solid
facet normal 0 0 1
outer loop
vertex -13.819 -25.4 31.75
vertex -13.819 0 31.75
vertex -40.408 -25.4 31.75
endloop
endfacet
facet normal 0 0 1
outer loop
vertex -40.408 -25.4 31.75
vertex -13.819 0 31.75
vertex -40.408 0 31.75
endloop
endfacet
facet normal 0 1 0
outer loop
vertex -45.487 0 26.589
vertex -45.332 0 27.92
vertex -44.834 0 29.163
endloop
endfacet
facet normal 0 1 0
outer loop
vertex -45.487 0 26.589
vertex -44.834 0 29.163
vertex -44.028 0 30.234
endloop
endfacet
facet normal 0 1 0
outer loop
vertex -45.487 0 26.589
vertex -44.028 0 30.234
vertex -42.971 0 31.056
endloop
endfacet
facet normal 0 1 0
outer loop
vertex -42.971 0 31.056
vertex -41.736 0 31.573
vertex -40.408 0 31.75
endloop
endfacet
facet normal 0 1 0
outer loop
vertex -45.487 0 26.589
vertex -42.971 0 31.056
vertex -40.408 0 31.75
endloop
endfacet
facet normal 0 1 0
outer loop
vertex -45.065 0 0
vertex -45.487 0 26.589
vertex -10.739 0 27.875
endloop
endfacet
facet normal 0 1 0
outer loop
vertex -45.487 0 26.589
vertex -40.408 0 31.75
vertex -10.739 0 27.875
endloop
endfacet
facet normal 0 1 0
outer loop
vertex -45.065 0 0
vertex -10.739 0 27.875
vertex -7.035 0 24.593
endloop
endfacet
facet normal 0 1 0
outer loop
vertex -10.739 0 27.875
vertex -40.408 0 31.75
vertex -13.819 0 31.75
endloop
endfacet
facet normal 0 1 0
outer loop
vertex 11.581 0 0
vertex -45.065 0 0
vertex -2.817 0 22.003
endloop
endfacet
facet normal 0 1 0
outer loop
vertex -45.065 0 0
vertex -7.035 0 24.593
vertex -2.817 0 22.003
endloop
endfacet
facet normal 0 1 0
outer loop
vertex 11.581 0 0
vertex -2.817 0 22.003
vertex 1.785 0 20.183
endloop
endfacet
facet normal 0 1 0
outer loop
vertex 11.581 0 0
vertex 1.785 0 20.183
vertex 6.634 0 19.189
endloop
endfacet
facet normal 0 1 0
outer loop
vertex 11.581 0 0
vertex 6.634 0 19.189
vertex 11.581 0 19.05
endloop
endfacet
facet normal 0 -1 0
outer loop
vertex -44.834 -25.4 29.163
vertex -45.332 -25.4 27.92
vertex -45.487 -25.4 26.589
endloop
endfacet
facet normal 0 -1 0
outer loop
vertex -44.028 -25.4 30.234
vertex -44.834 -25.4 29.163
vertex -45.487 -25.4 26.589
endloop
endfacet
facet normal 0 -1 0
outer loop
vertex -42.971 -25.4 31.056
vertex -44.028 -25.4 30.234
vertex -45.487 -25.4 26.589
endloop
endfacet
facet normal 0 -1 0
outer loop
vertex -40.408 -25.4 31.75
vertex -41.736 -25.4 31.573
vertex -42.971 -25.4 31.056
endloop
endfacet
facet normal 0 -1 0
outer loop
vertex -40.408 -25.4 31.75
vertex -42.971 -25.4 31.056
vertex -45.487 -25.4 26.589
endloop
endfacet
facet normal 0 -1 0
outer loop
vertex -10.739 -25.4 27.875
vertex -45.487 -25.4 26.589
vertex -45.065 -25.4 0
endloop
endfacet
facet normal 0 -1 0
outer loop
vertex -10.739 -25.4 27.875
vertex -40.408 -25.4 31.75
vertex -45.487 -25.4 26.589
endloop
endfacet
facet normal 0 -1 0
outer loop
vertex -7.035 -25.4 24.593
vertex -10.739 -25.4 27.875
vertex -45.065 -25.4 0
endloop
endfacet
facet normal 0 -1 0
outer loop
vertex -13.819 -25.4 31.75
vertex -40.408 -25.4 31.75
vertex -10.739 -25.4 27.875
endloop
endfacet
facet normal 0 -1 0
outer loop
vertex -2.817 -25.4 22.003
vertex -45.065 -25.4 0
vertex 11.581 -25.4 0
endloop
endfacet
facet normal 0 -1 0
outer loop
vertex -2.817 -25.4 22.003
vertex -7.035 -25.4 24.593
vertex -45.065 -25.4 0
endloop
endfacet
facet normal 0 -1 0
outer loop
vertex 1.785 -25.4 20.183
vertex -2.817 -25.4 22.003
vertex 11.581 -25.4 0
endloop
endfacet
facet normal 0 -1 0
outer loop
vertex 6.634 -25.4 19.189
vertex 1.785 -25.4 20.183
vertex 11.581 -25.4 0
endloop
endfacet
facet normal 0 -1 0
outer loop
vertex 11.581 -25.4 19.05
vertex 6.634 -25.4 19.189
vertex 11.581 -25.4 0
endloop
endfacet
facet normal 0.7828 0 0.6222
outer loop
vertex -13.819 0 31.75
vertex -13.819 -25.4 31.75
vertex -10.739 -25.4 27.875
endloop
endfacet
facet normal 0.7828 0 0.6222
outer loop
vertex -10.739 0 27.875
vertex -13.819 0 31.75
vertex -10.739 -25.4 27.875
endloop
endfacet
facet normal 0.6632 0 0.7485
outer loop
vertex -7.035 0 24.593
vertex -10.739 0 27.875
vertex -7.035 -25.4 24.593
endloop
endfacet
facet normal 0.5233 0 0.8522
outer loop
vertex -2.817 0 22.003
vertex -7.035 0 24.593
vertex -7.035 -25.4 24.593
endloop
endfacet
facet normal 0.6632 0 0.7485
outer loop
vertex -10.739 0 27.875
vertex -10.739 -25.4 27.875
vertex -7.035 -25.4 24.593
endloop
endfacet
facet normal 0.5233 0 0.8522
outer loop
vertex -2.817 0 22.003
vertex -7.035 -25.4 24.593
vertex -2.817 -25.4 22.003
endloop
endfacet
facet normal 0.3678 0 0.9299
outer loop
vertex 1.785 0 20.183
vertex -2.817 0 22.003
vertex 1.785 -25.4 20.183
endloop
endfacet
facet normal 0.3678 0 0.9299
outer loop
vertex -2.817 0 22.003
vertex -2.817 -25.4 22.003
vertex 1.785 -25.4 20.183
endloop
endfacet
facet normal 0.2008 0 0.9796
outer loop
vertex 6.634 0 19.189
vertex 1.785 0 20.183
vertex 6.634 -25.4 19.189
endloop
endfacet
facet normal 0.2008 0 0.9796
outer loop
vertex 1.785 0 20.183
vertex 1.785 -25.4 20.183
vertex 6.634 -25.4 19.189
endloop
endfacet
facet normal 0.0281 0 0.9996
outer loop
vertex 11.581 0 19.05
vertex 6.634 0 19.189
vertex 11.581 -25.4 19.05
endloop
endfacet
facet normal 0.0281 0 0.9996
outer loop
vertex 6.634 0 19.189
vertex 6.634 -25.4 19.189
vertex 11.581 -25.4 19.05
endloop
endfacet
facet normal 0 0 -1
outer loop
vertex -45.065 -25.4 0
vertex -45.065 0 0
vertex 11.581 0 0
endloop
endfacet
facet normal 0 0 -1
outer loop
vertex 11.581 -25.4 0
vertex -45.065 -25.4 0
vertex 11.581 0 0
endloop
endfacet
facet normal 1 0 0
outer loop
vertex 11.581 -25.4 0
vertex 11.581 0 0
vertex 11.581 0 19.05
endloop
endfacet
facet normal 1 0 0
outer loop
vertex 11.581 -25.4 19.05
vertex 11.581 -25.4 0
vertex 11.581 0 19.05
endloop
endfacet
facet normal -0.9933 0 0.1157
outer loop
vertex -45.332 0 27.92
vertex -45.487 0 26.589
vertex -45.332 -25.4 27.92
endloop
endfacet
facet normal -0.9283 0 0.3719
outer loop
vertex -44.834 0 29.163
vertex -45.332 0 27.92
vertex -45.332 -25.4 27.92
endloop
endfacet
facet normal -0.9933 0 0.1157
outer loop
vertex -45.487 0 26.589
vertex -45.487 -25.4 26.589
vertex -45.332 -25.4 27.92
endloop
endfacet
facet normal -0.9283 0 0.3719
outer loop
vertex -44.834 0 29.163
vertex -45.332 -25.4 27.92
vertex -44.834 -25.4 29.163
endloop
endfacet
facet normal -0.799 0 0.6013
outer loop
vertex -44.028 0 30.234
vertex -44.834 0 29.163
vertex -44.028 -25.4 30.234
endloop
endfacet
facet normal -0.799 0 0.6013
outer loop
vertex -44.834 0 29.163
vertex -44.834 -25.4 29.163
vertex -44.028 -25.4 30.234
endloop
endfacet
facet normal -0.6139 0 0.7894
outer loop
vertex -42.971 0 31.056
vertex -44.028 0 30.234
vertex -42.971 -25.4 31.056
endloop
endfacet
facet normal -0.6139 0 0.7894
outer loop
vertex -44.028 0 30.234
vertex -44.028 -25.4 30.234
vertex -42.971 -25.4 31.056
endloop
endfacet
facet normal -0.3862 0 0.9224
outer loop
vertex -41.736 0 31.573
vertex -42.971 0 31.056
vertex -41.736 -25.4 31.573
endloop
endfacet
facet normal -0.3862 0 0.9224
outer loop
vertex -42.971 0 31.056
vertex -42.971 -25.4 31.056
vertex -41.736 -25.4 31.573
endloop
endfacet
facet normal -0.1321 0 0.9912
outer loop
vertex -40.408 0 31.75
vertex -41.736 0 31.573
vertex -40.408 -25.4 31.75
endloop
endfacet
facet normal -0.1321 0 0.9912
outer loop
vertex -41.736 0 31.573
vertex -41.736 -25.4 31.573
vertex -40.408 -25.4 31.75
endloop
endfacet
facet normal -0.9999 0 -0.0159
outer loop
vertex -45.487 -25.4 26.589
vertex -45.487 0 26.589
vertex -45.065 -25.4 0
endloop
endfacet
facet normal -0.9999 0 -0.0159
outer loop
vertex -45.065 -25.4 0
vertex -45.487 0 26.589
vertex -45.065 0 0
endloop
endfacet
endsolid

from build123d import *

# Parameters (mm, degrees)
F1_DEPTH = 25.4
F3_DEPTH = 25.4
F4_R     = 5.08


with BuildPart() as f1:
    # F0 (on Front) → F1 (new body)
    with BuildSketch(Plane.XZ):
        Polygon((-45.568943, 31.75), (-45.065421, 0), (11.581057, 0), (11.581057, 31.75), align=None)
    extrude(amount=F1_DEPTH)

    # F2 (on face) → F3 (cut)
    with BuildSketch(Plane.XZ.offset(25.4)):
        with BuildLine():
            Line((11.581057, 31.75), (-13.818943, 31.75))
            ThreePointArc((-13.818943, 31.75), (-2.817404, 22.003079), (11.581057, 19.05))
            Line((11.581057, 19.05), (11.581057, 31.75))
        make_face()
    extrude(amount=-F3_DEPTH, mode=Mode.SUBTRACT)

    # F4
    f4_edges = [f1.edges().sort_by_distance(p)[0] for p in [
        (-45.568943, -12.7, 31.75),
    ]]
    fillet(f4_edges, radius=F4_R)


solid = f1.part
